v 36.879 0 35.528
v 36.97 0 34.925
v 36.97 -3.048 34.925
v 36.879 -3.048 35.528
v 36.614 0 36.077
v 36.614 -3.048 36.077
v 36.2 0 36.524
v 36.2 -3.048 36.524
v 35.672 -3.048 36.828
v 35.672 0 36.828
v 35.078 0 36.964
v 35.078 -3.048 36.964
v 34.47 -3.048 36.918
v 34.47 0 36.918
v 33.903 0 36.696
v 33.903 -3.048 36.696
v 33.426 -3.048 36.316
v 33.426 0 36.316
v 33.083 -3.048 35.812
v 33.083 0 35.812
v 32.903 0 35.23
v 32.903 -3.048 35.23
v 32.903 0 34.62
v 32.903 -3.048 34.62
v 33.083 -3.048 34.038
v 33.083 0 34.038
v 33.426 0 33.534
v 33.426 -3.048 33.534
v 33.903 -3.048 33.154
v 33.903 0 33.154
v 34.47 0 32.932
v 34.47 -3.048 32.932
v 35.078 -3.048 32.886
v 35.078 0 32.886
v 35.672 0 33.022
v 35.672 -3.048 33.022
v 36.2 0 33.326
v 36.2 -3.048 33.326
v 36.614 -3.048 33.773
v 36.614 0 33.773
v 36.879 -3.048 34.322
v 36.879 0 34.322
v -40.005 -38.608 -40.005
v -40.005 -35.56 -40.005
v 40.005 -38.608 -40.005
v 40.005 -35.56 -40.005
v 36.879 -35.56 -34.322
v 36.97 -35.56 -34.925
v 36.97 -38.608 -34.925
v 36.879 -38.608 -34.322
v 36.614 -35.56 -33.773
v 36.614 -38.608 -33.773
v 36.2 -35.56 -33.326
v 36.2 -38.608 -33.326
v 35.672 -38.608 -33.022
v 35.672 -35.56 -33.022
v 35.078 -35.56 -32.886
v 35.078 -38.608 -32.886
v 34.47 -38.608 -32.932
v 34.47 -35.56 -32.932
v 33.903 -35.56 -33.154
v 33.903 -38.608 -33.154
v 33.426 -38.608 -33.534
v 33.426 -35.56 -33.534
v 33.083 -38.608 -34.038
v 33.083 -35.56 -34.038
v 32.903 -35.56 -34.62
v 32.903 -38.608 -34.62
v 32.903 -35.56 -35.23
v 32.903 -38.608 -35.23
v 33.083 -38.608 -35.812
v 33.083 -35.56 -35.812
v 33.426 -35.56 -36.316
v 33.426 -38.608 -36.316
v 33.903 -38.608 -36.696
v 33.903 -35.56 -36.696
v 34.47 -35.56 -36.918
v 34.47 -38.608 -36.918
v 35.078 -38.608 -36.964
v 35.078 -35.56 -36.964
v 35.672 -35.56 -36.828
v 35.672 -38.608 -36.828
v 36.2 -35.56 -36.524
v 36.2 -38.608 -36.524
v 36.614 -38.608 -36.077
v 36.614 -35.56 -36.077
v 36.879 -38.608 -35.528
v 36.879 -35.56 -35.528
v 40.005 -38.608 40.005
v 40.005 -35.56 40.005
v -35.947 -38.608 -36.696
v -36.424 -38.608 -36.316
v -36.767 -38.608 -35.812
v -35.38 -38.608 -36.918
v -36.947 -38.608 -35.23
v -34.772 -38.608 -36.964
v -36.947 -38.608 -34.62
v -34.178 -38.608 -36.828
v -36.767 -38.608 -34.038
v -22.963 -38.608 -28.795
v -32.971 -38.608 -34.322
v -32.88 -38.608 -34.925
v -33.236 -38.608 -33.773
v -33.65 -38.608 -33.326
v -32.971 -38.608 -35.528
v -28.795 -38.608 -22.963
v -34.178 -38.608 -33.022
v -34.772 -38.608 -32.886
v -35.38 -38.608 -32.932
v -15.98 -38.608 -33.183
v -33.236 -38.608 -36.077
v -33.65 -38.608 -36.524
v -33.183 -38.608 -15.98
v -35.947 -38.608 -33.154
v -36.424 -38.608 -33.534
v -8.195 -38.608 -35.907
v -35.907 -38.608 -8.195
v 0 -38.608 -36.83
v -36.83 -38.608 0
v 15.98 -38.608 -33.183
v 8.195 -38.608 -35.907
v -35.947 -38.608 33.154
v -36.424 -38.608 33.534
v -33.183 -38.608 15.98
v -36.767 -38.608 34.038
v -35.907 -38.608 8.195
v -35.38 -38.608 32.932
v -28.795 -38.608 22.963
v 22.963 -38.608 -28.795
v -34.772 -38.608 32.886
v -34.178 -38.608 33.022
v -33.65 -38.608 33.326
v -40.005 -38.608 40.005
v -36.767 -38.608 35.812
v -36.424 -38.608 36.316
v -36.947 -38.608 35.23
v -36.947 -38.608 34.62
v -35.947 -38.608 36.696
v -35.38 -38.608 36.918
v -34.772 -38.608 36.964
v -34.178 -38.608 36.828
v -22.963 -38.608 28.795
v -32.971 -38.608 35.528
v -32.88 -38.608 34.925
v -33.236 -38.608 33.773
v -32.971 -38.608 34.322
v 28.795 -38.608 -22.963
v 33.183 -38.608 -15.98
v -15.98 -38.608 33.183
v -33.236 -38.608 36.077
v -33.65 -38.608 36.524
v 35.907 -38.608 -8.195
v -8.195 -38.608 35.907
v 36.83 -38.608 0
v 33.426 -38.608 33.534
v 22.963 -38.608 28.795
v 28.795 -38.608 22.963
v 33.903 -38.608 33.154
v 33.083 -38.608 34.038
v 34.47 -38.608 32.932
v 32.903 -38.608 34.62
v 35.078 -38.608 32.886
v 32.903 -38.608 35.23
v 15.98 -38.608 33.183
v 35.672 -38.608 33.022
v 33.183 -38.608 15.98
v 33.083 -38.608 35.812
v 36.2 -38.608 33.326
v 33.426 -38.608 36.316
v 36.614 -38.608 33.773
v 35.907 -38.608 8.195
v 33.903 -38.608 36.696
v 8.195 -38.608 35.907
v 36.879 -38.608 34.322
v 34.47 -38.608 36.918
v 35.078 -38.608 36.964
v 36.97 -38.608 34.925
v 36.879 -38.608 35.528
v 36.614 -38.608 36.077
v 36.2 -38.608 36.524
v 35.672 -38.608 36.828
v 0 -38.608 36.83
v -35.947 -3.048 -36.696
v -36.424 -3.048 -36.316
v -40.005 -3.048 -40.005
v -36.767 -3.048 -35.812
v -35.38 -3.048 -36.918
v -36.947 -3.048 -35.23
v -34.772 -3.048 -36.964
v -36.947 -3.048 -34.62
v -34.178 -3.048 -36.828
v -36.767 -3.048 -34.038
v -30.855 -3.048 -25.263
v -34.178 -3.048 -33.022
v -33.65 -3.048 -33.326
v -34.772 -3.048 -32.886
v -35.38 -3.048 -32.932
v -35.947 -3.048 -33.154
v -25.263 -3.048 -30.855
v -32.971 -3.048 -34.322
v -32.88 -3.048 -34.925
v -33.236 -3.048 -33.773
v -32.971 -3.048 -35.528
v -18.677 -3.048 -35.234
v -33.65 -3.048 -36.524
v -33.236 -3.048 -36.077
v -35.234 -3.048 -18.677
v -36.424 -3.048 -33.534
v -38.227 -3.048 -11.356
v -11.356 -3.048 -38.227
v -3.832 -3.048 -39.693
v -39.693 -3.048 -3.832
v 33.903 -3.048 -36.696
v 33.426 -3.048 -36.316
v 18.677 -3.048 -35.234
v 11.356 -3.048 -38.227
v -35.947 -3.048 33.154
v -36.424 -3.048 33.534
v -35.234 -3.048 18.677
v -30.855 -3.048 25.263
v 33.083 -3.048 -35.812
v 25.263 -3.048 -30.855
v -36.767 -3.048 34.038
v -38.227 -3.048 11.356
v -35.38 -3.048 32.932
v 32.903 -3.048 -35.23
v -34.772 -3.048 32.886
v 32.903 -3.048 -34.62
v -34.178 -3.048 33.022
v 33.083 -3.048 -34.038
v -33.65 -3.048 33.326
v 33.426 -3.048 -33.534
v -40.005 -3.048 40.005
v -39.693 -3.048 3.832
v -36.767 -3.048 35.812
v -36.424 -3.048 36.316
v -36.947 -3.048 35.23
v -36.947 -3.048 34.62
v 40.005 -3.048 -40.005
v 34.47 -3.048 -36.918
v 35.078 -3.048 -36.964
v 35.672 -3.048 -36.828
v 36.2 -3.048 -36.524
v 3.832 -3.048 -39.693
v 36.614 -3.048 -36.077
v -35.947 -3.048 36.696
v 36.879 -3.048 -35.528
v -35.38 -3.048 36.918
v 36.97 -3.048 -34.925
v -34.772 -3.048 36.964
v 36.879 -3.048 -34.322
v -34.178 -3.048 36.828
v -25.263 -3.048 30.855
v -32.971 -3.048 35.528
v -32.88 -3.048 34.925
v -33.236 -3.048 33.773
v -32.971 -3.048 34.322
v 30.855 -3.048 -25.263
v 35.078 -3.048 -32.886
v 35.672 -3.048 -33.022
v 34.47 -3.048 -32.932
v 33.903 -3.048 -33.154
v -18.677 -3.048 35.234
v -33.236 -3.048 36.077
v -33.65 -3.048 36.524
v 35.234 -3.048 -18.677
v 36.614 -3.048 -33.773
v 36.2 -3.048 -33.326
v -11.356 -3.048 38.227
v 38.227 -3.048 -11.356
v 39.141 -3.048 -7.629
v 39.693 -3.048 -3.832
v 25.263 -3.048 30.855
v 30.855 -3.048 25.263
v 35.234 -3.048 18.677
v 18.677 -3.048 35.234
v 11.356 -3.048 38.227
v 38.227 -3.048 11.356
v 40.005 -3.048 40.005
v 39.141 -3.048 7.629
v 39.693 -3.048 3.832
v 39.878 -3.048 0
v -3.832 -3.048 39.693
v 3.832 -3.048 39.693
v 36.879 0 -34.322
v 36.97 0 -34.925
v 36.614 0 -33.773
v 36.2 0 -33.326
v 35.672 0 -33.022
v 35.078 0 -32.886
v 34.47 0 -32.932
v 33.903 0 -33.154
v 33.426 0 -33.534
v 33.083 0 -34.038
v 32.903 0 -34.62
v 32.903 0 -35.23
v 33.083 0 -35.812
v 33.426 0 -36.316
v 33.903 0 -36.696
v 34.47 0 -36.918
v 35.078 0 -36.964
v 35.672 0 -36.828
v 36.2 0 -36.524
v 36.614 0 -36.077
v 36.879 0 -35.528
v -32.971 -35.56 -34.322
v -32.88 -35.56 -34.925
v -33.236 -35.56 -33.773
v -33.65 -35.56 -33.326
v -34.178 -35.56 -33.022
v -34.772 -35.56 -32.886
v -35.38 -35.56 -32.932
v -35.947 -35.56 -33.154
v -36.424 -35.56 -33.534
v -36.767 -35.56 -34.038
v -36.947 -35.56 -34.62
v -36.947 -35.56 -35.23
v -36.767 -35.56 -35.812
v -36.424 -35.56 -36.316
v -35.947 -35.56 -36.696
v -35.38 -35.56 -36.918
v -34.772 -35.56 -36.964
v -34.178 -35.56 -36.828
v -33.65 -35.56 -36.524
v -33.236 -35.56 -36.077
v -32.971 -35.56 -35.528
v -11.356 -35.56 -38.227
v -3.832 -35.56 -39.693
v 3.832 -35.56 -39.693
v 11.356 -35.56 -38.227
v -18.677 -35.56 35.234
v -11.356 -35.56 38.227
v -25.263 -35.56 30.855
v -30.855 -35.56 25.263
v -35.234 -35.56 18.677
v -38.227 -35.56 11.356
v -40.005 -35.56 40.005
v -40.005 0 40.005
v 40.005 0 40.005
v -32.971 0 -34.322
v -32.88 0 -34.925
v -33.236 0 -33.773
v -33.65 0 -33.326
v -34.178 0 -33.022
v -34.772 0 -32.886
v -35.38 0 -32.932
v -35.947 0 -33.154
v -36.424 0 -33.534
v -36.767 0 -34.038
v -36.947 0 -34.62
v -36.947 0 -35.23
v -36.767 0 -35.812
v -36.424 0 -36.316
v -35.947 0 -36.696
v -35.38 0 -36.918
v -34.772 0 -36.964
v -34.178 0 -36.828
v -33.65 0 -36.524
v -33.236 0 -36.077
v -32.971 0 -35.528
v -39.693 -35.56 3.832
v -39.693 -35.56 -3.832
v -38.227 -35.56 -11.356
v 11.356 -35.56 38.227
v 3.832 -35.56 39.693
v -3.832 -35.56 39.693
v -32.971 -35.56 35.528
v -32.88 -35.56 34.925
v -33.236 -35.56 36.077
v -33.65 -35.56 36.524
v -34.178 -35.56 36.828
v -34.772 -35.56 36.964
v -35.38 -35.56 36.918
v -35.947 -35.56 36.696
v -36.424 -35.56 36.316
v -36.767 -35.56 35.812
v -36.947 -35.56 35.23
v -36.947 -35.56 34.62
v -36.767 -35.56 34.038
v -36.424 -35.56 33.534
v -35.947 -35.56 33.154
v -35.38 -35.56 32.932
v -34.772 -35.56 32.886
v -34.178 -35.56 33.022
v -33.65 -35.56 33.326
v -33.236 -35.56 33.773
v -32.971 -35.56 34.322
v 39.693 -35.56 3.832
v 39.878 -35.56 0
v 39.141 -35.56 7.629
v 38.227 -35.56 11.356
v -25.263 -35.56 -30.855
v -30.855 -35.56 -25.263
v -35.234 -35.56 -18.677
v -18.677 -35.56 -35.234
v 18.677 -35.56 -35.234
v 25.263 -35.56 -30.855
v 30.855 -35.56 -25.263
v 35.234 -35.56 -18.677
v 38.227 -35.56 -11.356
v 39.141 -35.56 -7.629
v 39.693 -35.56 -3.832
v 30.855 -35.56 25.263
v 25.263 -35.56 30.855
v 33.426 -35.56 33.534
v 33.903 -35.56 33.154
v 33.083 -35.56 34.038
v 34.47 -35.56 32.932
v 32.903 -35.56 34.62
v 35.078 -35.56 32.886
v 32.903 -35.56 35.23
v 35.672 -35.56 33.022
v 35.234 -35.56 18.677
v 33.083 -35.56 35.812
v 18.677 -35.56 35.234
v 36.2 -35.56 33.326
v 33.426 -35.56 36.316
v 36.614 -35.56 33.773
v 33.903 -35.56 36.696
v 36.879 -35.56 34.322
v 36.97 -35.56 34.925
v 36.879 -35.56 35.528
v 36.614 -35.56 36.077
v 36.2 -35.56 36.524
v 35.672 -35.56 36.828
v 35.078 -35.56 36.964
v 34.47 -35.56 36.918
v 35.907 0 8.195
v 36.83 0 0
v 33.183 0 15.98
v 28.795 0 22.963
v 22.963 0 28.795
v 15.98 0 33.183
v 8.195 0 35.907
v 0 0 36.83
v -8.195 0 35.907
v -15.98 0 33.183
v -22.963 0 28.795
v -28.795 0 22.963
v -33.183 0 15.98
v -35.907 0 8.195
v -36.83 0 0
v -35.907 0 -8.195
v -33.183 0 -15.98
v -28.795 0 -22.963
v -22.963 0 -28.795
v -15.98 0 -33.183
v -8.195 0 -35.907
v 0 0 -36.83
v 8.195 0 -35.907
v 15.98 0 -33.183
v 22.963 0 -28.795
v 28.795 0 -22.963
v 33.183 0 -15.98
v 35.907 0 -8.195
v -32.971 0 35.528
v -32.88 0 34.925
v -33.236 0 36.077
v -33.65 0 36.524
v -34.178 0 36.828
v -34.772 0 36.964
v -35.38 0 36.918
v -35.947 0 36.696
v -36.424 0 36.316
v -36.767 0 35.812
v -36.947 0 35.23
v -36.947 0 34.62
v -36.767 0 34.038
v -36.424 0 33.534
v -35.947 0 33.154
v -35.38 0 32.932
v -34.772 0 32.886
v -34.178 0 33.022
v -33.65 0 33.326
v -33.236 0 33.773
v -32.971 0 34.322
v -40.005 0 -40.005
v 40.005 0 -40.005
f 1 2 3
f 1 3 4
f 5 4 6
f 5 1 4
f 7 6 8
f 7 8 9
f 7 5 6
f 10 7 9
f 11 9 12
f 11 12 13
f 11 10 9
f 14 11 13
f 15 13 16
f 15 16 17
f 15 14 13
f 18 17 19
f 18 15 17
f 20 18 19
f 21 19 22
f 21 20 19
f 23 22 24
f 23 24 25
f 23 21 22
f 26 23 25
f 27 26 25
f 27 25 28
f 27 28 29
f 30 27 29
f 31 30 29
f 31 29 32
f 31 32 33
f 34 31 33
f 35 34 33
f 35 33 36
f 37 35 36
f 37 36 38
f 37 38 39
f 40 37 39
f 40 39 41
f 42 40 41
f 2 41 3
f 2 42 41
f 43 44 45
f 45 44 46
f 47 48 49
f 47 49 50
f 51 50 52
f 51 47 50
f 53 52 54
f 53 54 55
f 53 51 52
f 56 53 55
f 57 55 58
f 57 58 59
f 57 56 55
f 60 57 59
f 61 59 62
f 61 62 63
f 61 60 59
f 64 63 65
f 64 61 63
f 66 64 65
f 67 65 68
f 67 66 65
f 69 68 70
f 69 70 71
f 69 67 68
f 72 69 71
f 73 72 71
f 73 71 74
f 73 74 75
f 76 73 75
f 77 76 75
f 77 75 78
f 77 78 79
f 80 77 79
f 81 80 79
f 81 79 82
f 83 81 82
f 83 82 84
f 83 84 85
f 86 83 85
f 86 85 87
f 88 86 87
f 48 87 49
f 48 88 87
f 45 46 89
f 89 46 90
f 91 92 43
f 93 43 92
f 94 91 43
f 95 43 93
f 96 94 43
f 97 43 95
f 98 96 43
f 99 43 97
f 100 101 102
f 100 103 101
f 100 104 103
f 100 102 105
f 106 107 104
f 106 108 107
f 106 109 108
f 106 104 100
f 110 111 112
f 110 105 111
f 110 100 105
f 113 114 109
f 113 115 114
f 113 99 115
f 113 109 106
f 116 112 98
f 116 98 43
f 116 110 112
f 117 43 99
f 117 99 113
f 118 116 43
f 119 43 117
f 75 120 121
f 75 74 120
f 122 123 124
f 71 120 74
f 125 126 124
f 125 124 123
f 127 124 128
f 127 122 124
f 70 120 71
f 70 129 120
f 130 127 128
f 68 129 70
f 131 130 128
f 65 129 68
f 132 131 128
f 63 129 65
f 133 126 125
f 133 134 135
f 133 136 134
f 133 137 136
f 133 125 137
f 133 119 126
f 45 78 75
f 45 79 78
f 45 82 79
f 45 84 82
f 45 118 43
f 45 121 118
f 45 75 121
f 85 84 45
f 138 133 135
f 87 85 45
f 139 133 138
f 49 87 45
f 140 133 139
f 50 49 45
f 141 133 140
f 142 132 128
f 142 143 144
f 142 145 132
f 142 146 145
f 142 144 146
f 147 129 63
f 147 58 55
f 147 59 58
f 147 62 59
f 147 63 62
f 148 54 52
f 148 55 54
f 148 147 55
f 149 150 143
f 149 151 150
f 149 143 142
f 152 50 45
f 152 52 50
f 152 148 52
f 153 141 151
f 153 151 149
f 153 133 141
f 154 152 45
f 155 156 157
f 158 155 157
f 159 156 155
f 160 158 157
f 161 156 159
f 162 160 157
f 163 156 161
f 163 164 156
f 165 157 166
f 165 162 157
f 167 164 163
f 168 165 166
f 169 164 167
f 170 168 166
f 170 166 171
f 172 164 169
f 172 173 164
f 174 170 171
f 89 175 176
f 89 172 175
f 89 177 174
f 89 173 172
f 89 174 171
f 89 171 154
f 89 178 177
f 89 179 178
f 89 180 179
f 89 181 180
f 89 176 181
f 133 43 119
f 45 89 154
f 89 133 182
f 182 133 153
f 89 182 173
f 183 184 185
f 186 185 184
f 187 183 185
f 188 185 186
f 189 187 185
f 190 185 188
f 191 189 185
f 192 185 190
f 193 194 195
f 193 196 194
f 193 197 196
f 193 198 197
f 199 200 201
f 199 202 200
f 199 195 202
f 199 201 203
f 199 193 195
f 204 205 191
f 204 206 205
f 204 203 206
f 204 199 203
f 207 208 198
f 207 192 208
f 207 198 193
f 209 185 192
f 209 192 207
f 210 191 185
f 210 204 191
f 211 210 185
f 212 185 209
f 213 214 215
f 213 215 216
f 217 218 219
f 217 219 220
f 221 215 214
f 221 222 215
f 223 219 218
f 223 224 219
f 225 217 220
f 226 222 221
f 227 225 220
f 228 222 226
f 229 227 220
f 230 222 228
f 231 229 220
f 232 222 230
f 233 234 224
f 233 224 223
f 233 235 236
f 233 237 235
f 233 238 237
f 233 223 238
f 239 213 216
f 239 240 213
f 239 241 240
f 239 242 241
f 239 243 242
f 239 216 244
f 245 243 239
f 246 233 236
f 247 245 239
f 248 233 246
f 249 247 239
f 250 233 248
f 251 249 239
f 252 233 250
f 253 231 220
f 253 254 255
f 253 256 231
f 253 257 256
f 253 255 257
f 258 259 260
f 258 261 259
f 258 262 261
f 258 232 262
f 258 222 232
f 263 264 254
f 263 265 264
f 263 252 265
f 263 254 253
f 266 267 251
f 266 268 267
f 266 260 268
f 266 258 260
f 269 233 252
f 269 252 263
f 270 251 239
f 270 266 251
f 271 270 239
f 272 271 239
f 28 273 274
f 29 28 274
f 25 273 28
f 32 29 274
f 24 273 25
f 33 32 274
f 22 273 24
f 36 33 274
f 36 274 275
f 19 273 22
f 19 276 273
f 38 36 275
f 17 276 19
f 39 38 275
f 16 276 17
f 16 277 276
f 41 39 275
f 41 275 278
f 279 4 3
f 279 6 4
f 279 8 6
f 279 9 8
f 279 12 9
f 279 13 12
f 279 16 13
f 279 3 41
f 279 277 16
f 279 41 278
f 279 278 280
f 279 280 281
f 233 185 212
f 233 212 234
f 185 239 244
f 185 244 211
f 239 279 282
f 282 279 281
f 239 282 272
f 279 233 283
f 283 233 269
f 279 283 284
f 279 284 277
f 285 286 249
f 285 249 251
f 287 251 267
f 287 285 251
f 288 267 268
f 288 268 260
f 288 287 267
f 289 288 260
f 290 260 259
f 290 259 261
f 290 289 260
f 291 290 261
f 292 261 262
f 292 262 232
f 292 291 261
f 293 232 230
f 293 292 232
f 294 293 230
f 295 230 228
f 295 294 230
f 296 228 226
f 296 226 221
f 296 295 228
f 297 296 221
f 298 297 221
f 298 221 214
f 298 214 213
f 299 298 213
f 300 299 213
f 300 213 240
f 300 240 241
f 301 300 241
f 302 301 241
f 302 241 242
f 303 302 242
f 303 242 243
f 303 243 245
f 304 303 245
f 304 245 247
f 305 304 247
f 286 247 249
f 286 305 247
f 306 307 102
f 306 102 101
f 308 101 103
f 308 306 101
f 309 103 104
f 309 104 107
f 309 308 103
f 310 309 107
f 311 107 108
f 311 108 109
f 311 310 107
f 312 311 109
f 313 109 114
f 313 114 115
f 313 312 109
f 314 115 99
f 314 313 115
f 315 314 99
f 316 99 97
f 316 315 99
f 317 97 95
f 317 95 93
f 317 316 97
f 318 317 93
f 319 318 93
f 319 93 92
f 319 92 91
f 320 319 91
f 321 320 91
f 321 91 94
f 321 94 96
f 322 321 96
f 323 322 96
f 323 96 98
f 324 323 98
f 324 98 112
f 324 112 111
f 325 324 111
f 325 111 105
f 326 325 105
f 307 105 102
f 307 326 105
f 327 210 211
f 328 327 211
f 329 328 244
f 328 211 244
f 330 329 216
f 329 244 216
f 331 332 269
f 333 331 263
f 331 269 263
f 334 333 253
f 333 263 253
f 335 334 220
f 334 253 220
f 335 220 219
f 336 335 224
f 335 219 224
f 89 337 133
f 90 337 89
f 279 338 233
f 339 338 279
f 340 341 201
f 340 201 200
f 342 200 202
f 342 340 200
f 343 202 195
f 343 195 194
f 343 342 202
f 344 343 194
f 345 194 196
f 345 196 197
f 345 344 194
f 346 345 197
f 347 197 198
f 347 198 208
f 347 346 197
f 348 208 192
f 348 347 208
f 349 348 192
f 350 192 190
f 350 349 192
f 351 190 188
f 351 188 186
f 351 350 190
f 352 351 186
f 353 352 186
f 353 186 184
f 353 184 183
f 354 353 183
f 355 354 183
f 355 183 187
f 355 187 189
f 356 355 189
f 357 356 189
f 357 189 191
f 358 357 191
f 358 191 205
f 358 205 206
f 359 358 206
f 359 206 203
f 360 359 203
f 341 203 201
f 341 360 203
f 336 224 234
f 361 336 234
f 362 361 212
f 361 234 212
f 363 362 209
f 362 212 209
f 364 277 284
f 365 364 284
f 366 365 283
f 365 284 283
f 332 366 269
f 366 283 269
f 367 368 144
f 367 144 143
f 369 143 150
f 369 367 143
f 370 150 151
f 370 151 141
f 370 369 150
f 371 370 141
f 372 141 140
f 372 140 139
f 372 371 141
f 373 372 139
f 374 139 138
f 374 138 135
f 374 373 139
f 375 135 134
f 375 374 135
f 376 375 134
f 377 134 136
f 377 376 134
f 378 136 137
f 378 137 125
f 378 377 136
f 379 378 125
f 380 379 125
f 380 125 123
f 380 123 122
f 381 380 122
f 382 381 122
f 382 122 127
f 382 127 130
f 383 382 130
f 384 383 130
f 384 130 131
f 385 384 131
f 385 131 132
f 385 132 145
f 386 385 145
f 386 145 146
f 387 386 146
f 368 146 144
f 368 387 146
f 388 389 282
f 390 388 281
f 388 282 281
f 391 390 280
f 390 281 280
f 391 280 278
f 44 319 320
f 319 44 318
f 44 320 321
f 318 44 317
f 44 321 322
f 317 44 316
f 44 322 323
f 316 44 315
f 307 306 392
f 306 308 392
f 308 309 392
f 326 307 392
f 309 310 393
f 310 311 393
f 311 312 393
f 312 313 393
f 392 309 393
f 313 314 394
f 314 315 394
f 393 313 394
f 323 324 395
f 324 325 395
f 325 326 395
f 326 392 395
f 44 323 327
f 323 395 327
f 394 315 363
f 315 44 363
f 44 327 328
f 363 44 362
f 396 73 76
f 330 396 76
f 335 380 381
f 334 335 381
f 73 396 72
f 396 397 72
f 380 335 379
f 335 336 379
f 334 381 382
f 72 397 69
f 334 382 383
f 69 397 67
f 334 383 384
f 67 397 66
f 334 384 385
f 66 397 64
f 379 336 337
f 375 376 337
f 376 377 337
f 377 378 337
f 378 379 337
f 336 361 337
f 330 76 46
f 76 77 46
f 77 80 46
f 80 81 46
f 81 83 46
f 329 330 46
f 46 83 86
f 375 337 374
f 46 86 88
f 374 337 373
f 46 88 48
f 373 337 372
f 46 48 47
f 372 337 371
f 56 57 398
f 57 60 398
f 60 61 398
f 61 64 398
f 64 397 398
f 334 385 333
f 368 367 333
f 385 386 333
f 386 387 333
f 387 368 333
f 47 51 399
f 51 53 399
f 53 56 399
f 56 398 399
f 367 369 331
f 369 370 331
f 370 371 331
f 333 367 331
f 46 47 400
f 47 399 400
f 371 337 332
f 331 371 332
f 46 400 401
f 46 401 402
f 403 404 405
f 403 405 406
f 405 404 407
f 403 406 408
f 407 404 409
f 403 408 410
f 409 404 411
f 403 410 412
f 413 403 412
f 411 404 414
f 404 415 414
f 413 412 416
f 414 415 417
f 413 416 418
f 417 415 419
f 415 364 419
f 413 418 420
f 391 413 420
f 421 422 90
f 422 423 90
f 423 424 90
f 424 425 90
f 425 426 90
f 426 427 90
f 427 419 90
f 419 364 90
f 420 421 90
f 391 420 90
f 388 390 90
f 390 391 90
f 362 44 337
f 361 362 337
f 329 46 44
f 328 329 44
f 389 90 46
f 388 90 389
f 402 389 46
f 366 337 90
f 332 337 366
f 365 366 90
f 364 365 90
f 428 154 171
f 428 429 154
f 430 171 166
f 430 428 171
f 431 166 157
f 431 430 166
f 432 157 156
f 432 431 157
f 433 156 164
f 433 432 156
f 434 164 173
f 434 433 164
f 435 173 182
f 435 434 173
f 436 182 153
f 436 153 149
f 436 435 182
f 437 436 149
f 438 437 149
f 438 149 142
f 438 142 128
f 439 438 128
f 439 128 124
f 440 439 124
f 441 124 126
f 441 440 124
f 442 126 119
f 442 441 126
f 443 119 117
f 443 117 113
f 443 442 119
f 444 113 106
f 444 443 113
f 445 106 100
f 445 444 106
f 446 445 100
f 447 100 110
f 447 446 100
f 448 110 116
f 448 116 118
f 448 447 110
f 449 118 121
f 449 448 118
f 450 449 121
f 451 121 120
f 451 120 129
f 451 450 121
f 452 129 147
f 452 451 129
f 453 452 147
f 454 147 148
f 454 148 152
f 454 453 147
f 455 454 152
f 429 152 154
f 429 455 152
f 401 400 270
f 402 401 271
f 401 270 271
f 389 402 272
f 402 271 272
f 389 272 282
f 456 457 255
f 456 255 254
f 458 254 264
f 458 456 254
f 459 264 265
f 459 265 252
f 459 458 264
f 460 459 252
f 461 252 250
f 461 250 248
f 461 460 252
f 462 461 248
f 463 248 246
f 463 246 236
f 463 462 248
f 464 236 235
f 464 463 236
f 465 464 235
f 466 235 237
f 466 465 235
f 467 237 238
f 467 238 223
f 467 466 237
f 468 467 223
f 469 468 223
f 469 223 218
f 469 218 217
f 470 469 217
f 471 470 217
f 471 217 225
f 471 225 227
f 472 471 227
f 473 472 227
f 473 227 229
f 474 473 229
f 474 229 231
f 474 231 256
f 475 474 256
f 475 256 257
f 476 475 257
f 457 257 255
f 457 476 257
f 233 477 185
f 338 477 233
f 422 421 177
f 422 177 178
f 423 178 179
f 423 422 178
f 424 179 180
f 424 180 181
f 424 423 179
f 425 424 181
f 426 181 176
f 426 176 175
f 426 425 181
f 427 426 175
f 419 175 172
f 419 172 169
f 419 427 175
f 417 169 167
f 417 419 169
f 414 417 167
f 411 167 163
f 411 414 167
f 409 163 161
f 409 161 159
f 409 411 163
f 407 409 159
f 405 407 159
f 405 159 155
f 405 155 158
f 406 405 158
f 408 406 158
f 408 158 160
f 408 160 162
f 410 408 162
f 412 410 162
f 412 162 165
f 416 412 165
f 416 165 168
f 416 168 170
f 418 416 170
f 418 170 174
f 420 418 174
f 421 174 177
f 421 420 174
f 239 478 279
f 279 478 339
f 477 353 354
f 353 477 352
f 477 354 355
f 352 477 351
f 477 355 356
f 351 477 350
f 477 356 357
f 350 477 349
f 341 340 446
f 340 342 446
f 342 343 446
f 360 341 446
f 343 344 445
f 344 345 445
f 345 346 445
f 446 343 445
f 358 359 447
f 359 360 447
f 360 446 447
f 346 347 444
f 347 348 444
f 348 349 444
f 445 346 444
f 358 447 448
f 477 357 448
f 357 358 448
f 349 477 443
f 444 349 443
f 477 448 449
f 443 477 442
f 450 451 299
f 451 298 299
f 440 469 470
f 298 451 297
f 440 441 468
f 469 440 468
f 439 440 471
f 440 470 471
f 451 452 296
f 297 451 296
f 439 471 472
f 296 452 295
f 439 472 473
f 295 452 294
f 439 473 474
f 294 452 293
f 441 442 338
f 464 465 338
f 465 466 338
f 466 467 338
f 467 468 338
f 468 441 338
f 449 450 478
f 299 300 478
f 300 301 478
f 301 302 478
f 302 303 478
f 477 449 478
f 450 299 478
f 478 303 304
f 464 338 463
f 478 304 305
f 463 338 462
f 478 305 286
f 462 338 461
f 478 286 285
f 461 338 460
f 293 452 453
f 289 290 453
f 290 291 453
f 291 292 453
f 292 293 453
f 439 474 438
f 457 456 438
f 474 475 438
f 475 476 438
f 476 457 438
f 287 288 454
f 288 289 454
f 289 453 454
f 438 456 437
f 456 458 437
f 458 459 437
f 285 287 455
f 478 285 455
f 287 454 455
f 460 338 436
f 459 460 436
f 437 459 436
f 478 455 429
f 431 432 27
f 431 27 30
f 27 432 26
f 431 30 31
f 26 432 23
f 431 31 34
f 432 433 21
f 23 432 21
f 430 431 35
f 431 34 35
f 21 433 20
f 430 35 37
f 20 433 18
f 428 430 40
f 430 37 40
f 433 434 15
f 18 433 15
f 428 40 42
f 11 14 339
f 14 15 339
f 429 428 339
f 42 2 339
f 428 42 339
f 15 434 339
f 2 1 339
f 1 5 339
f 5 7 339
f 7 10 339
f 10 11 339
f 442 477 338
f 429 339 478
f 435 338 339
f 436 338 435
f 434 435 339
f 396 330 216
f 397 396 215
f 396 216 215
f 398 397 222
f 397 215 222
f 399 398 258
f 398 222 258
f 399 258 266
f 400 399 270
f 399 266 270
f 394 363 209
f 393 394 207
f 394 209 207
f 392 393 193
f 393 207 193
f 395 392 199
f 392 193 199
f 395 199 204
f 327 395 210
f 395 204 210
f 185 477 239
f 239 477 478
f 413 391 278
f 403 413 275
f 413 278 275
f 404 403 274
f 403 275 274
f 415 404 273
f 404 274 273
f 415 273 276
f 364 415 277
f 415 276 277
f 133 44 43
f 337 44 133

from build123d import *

# Parameters (mm, degrees)
F0_W     = 80.01
F0_H     = 80.01
F0_R     = 2.0447
F1_DEPTH = 3.048
F0_R_2   = 36.83
F2_DEPTH = 35.56
F3_W     = 80.01
F3_H     = 80.01
F3_R     = 2.0447
F3_R_2   = 36.83
F4_DEPTH = 3.048


with BuildPart() as f1:
    # F0 (on Front) → F1 (new body)
    with BuildSketch(Plane.XZ):
        Rectangle(F0_W, F0_H)
        with BuildLine():
            Line((11.355675013, 38.227), (24.6347928475, 38.227))
            Line((24.6347928475, 38.227), (38.227, 38.227))
            Line((38.227, 38.227), (38.227, 24.6347928475))
            Line((38.227, 24.6347928475), (38.227, 11.355675013))
            ThreePointArc((38.227, 11.355675013), (39.463091554, 5.737533355), (39.878, 0))
            ThreePointArc((39.878, 0), (39.463091554, -5.737533355), (38.227, -11.355675013))
            Line((38.227, -11.355675013), (38.227, -24.6347928475))
            Line((38.227, -24.6347928475), (38.227, -38.227))
            Line((38.227, -38.227), (24.6347928475, -38.227))
            Line((24.6347928475, -38.227), (11.355675013, -38.227))
            ThreePointArc((11.355675013, -38.227), (0, -39.878), (-11.355675013, -38.227))
            Line((-11.355675013, -38.227), (-24.6347928475, -38.227))
            Line((-24.6347928475, -38.227), (-38.227, -38.227))
            Line((-38.227, -38.227), (-38.227, -24.6347928475))
            Line((-38.227, -24.6347928475), (-38.227, -11.355675013))
            ThreePointArc((-38.227, -11.355675013), (-39.878, 0), (-38.227, 11.355675013))
            Line((-38.227, 11.355675013), (-38.227, 24.6347928475))
            Line((-38.227, 24.6347928475), (-38.227, 38.227))
            Line((-38.227, 38.227), (-24.6347928475, 38.227))
            Line((-24.6347928475, 38.227), (-11.355675013, 38.227))
            ThreePointArc((-11.355675013, 38.227), (0, 39.878), (11.355675013, 38.227))
        make_face(mode=Mode.SUBTRACT)
        Polygon((38.227, 38.227), (24.6347928475, 38.227), (38.227, 24.6347928475), align=None)
        with Locations((34.925, 34.925)):
            Circle(F0_R, mode=Mode.SUBTRACT)
        Polygon((38.227, -38.227), (38.227, -24.6347928475), (24.6347928475, -38.227), align=None)
        with Locations((34.925, -34.925)):
            Circle(F0_R, mode=Mode.SUBTRACT)
        Polygon((-24.6347928475, -38.227), (-38.227, -24.6347928475), (-38.227, -38.227), align=None)
        with Locations((-34.925, -34.925)):
            Circle(F0_R, mode=Mode.SUBTRACT)
        Polygon((-38.227, 24.6347928475), (-24.6347928475, 38.227), (-38.227, 38.227), align=None)
        with Locations((-34.925, 34.925)):
            Circle(F0_R, mode=Mode.SUBTRACT)
        with BuildLine():
            Line((-11.355675013, 38.227), (11.355675013, 38.227))
            ThreePointArc((11.355675013, 38.227), (0, 39.878), (-11.355675013, 38.227))
        make_face()
        with BuildLine():
            ThreePointArc((39.878, 0), (39.463091554, 5.737533355), (38.227, 11.355675013))
            Line((38.227, 11.355675013), (38.227, -11.355675013))
            ThreePointArc((38.227, -11.355675013), (39.463091554, -5.737533355), (39.878, 0))
        make_face()
        with BuildLine():
            ThreePointArc((-11.355675013, -38.227), (0, -39.878), (11.355675013, -38.227))
            Line((11.355675013, -38.227), (-11.355675013, -38.227))
        make_face()
        with BuildLine():
            Line((-38.227, -11.355675013), (-38.227, 11.355675013))
            ThreePointArc((-38.227, 11.355675013), (-39.878, 0), (-38.227, -11.355675013))
        make_face()
        with BuildLine():
            ThreePointArc((-11.355675013, -38.227), (-28.1980042202, -28.1980042202), (-38.227, -11.355675013))
            Line((-38.227, -11.355675013), (-38.227, -24.6347928475))
            Line((-38.227, -24.6347928475), (-24.6347928475, -38.227))
            Line((-24.6347928475, -38.227), (-11.355675013, -38.227))
        make_face()
        with BuildLine():
            ThreePointArc((-38.227, 11.355675013), (-28.1980042202, 28.1980042202), (-11.355675013, 38.227))
            Line((-11.355675013, 38.227), (-24.6347928475, 38.227))
            Line((-24.6347928475, 38.227), (-38.227, 24.6347928475))
            Line((-38.227, 24.6347928475), (-38.227, 11.355675013))
        make_face()
        with BuildLine():
            Line((38.227, 24.6347928475), (24.6347928475, 38.227))
            Line((24.6347928475, 38.227), (11.355675013, 38.227))
            ThreePointArc((11.355675013, 38.227), (28.1980042202, 28.1980042202), (38.227, 11.355675013))
            Line((38.227, 11.355675013), (38.227, 24.6347928475))
        make_face()
        with BuildLine():
            Line((38.227, -24.6347928475), (38.227, -11.355675013))
            ThreePointArc((38.227, -11.355675013), (28.1980042202, -28.1980042202), (11.355675013, -38.227))
            Line((11.355675013, -38.227), (24.6347928475, -38.227))
            Line((24.6347928475, -38.227), (38.227, -24.6347928475))
        make_face()
    extrude(amount=F1_DEPTH)

    # F0 (on Front) → F2 (join)
    with BuildSketch(Plane.XZ):
        with BuildLine():
            ThreePointArc((38.227, 11.355675013), (28.1980042202, 28.1980042202), (11.355675013, 38.227))
            Line((11.355675013, 38.227), (-11.355675013, 38.227))
            ThreePointArc((-11.355675013, 38.227), (-28.1980042202, 28.1980042202), (-38.227, 11.355675013))
            Line((-38.227, 11.355675013), (-38.227, -11.355675013))
            ThreePointArc((-38.227, -11.355675013), (-28.1980042202, -28.1980042202), (-11.355675013, -38.227))
            Line((-11.355675013, -38.227), (11.355675013, -38.227))
            ThreePointArc((11.355675013, -38.227), (28.1980042202, -28.1980042202), (38.227, -11.355675013))
            Line((38.227, -11.355675013), (38.227, 11.355675013))
        make_face()
        Circle(F0_R_2, mode=Mode.SUBTRACT)
        with BuildLine():
            ThreePointArc((39.878, 0), (39.463091554, 5.737533355), (38.227, 11.355675013))
            Line((38.227, 11.355675013), (38.227, -11.355675013))
            ThreePointArc((38.227, -11.355675013), (39.463091554, -5.737533355), (39.878, 0))
        make_face()
        with BuildLine():
            Line((-38.227, -11.355675013), (-38.227, 11.355675013))
            ThreePointArc((-38.227, 11.355675013), (-39.878, 0), (-38.227, -11.355675013))
        make_face()
        with BuildLine():
            ThreePointArc((-11.355675013, -38.227), (0, -39.878), (11.355675013, -38.227))
            Line((11.355675013, -38.227), (-11.355675013, -38.227))
        make_face()
        with BuildLine():
            Line((-11.355675013, 38.227), (11.355675013, 38.227))
            ThreePointArc((11.355675013, 38.227), (0, 39.878), (-11.355675013, 38.227))
        make_face()
    extrude(amount=F2_DEPTH)

    # F3 (on face) → F4 (join)
    with BuildSketch(Plane.XZ.offset(35.56)):
        Rectangle(F3_W, F3_H)
        Polygon((-38.227, -38.227), (-38.227, -24.6347928475), (-38.227, 24.6347928475), (-38.227, 38.227), (-24.6347928475, 38.227), (24.6347928475, 38.227), (38.227, 38.227), (38.227, 24.6347928475), (38.227, -24.6347928475), (38.227, -38.227), (24.6347928475, -38.227), (-24.6347928475, -38.227), align=None, mode=Mode.SUBTRACT)
        Polygon((-24.6347928475, -38.227), (-38.227, -24.6347928475), (-38.227, -38.227), align=None)
        with Locations((-34.925, -34.925)):
            Circle(F3_R, mode=Mode.SUBTRACT)
        Polygon((-38.227, 38.227), (-38.227, 24.6347928475), (-24.6347928475, 38.227), align=None)
        with Locations((-34.925, 34.925)):
            Circle(F3_R, mode=Mode.SUBTRACT)
        Polygon((38.227, 38.227), (24.6347928475, 38.227), (38.227, 24.6347928475), align=None)
        with Locations((34.925, 34.925)):
            Circle(F3_R, mode=Mode.SUBTRACT)
        Polygon((38.227, -24.6347928475), (24.6347928475, -38.227), (38.227, -38.227), align=None)
        with Locations((34.925, -34.925)):
            Circle(F3_R, mode=Mode.SUBTRACT)
        with BuildLine():
            Line((-38.227, 11.355675013), (-38.227, -11.355675013))
            ThreePointArc((-38.227, -11.355675013), (-28.1980042202, -28.1980042202), (-11.355675013, -38.227))
            Line((-11.355675013, -38.227), (11.355675013, -38.227))
            ThreePointArc((11.355675013, -38.227), (28.1980042202, -28.1980042202), (38.227, -11.355675013))
            Line((38.227, -11.355675013), (38.227, 11.355675013))
            ThreePointArc((38.227, 11.355675013), (28.1980042202, 28.1980042202), (11.355675013, 38.227))
            Line((11.355675013, 38.227), (-11.355675013, 38.227))
            ThreePointArc((-11.355675013, 38.227), (-28.1980042202, 28.1980042202), (-38.227, 11.355675013))
        make_face()
        Circle(F3_R_2, mode=Mode.SUBTRACT)
        with BuildLine():
            ThreePointArc((38.227, -11.355675013), (28.1980042202, -28.1980042202), (11.355675013, -38.227))
            Line((11.355675013, -38.227), (24.6347928475, -38.227))
            Line((24.6347928475, -38.227), (38.227, -24.6347928475))
            Line((38.227, -24.6347928475), (38.227, -11.355675013))
        make_face()
        with BuildLine():
            Line((24.6347928475, 38.227), (11.355675013, 38.227))
            ThreePointArc((11.355675013, 38.227), (28.1980042202, 28.1980042202), (38.227, 11.355675013))
            Line((38.227, 11.355675013), (38.227, 24.6347928475))
            Line((38.227, 24.6347928475), (24.6347928475, 38.227))
        make_face()
        with BuildLine():
            Line((-38.227, 24.6347928475), (-38.227, 11.355675013))
            ThreePointArc((-38.227, 11.355675013), (-28.1980042202, 28.1980042202), (-11.355675013, 38.227))
            Line((-11.355675013, 38.227), (-24.6347928475, 38.227))
            Line((-24.6347928475, 38.227), (-38.227, 24.6347928475))
        make_face()
        with BuildLine():
            Line((-38.227, -11.355675013), (-38.227, -24.6347928475))
            Line((-38.227, -24.6347928475), (-24.6347928475, -38.227))
            Line((-24.6347928475, -38.227), (-11.355675013, -38.227))
            ThreePointArc((-11.355675013, -38.227), (-28.1980042202, -28.1980042202), (-38.227, -11.355675013))
        make_face()
    extrude(amount=F4_DEPTH)


solid = f1.part
